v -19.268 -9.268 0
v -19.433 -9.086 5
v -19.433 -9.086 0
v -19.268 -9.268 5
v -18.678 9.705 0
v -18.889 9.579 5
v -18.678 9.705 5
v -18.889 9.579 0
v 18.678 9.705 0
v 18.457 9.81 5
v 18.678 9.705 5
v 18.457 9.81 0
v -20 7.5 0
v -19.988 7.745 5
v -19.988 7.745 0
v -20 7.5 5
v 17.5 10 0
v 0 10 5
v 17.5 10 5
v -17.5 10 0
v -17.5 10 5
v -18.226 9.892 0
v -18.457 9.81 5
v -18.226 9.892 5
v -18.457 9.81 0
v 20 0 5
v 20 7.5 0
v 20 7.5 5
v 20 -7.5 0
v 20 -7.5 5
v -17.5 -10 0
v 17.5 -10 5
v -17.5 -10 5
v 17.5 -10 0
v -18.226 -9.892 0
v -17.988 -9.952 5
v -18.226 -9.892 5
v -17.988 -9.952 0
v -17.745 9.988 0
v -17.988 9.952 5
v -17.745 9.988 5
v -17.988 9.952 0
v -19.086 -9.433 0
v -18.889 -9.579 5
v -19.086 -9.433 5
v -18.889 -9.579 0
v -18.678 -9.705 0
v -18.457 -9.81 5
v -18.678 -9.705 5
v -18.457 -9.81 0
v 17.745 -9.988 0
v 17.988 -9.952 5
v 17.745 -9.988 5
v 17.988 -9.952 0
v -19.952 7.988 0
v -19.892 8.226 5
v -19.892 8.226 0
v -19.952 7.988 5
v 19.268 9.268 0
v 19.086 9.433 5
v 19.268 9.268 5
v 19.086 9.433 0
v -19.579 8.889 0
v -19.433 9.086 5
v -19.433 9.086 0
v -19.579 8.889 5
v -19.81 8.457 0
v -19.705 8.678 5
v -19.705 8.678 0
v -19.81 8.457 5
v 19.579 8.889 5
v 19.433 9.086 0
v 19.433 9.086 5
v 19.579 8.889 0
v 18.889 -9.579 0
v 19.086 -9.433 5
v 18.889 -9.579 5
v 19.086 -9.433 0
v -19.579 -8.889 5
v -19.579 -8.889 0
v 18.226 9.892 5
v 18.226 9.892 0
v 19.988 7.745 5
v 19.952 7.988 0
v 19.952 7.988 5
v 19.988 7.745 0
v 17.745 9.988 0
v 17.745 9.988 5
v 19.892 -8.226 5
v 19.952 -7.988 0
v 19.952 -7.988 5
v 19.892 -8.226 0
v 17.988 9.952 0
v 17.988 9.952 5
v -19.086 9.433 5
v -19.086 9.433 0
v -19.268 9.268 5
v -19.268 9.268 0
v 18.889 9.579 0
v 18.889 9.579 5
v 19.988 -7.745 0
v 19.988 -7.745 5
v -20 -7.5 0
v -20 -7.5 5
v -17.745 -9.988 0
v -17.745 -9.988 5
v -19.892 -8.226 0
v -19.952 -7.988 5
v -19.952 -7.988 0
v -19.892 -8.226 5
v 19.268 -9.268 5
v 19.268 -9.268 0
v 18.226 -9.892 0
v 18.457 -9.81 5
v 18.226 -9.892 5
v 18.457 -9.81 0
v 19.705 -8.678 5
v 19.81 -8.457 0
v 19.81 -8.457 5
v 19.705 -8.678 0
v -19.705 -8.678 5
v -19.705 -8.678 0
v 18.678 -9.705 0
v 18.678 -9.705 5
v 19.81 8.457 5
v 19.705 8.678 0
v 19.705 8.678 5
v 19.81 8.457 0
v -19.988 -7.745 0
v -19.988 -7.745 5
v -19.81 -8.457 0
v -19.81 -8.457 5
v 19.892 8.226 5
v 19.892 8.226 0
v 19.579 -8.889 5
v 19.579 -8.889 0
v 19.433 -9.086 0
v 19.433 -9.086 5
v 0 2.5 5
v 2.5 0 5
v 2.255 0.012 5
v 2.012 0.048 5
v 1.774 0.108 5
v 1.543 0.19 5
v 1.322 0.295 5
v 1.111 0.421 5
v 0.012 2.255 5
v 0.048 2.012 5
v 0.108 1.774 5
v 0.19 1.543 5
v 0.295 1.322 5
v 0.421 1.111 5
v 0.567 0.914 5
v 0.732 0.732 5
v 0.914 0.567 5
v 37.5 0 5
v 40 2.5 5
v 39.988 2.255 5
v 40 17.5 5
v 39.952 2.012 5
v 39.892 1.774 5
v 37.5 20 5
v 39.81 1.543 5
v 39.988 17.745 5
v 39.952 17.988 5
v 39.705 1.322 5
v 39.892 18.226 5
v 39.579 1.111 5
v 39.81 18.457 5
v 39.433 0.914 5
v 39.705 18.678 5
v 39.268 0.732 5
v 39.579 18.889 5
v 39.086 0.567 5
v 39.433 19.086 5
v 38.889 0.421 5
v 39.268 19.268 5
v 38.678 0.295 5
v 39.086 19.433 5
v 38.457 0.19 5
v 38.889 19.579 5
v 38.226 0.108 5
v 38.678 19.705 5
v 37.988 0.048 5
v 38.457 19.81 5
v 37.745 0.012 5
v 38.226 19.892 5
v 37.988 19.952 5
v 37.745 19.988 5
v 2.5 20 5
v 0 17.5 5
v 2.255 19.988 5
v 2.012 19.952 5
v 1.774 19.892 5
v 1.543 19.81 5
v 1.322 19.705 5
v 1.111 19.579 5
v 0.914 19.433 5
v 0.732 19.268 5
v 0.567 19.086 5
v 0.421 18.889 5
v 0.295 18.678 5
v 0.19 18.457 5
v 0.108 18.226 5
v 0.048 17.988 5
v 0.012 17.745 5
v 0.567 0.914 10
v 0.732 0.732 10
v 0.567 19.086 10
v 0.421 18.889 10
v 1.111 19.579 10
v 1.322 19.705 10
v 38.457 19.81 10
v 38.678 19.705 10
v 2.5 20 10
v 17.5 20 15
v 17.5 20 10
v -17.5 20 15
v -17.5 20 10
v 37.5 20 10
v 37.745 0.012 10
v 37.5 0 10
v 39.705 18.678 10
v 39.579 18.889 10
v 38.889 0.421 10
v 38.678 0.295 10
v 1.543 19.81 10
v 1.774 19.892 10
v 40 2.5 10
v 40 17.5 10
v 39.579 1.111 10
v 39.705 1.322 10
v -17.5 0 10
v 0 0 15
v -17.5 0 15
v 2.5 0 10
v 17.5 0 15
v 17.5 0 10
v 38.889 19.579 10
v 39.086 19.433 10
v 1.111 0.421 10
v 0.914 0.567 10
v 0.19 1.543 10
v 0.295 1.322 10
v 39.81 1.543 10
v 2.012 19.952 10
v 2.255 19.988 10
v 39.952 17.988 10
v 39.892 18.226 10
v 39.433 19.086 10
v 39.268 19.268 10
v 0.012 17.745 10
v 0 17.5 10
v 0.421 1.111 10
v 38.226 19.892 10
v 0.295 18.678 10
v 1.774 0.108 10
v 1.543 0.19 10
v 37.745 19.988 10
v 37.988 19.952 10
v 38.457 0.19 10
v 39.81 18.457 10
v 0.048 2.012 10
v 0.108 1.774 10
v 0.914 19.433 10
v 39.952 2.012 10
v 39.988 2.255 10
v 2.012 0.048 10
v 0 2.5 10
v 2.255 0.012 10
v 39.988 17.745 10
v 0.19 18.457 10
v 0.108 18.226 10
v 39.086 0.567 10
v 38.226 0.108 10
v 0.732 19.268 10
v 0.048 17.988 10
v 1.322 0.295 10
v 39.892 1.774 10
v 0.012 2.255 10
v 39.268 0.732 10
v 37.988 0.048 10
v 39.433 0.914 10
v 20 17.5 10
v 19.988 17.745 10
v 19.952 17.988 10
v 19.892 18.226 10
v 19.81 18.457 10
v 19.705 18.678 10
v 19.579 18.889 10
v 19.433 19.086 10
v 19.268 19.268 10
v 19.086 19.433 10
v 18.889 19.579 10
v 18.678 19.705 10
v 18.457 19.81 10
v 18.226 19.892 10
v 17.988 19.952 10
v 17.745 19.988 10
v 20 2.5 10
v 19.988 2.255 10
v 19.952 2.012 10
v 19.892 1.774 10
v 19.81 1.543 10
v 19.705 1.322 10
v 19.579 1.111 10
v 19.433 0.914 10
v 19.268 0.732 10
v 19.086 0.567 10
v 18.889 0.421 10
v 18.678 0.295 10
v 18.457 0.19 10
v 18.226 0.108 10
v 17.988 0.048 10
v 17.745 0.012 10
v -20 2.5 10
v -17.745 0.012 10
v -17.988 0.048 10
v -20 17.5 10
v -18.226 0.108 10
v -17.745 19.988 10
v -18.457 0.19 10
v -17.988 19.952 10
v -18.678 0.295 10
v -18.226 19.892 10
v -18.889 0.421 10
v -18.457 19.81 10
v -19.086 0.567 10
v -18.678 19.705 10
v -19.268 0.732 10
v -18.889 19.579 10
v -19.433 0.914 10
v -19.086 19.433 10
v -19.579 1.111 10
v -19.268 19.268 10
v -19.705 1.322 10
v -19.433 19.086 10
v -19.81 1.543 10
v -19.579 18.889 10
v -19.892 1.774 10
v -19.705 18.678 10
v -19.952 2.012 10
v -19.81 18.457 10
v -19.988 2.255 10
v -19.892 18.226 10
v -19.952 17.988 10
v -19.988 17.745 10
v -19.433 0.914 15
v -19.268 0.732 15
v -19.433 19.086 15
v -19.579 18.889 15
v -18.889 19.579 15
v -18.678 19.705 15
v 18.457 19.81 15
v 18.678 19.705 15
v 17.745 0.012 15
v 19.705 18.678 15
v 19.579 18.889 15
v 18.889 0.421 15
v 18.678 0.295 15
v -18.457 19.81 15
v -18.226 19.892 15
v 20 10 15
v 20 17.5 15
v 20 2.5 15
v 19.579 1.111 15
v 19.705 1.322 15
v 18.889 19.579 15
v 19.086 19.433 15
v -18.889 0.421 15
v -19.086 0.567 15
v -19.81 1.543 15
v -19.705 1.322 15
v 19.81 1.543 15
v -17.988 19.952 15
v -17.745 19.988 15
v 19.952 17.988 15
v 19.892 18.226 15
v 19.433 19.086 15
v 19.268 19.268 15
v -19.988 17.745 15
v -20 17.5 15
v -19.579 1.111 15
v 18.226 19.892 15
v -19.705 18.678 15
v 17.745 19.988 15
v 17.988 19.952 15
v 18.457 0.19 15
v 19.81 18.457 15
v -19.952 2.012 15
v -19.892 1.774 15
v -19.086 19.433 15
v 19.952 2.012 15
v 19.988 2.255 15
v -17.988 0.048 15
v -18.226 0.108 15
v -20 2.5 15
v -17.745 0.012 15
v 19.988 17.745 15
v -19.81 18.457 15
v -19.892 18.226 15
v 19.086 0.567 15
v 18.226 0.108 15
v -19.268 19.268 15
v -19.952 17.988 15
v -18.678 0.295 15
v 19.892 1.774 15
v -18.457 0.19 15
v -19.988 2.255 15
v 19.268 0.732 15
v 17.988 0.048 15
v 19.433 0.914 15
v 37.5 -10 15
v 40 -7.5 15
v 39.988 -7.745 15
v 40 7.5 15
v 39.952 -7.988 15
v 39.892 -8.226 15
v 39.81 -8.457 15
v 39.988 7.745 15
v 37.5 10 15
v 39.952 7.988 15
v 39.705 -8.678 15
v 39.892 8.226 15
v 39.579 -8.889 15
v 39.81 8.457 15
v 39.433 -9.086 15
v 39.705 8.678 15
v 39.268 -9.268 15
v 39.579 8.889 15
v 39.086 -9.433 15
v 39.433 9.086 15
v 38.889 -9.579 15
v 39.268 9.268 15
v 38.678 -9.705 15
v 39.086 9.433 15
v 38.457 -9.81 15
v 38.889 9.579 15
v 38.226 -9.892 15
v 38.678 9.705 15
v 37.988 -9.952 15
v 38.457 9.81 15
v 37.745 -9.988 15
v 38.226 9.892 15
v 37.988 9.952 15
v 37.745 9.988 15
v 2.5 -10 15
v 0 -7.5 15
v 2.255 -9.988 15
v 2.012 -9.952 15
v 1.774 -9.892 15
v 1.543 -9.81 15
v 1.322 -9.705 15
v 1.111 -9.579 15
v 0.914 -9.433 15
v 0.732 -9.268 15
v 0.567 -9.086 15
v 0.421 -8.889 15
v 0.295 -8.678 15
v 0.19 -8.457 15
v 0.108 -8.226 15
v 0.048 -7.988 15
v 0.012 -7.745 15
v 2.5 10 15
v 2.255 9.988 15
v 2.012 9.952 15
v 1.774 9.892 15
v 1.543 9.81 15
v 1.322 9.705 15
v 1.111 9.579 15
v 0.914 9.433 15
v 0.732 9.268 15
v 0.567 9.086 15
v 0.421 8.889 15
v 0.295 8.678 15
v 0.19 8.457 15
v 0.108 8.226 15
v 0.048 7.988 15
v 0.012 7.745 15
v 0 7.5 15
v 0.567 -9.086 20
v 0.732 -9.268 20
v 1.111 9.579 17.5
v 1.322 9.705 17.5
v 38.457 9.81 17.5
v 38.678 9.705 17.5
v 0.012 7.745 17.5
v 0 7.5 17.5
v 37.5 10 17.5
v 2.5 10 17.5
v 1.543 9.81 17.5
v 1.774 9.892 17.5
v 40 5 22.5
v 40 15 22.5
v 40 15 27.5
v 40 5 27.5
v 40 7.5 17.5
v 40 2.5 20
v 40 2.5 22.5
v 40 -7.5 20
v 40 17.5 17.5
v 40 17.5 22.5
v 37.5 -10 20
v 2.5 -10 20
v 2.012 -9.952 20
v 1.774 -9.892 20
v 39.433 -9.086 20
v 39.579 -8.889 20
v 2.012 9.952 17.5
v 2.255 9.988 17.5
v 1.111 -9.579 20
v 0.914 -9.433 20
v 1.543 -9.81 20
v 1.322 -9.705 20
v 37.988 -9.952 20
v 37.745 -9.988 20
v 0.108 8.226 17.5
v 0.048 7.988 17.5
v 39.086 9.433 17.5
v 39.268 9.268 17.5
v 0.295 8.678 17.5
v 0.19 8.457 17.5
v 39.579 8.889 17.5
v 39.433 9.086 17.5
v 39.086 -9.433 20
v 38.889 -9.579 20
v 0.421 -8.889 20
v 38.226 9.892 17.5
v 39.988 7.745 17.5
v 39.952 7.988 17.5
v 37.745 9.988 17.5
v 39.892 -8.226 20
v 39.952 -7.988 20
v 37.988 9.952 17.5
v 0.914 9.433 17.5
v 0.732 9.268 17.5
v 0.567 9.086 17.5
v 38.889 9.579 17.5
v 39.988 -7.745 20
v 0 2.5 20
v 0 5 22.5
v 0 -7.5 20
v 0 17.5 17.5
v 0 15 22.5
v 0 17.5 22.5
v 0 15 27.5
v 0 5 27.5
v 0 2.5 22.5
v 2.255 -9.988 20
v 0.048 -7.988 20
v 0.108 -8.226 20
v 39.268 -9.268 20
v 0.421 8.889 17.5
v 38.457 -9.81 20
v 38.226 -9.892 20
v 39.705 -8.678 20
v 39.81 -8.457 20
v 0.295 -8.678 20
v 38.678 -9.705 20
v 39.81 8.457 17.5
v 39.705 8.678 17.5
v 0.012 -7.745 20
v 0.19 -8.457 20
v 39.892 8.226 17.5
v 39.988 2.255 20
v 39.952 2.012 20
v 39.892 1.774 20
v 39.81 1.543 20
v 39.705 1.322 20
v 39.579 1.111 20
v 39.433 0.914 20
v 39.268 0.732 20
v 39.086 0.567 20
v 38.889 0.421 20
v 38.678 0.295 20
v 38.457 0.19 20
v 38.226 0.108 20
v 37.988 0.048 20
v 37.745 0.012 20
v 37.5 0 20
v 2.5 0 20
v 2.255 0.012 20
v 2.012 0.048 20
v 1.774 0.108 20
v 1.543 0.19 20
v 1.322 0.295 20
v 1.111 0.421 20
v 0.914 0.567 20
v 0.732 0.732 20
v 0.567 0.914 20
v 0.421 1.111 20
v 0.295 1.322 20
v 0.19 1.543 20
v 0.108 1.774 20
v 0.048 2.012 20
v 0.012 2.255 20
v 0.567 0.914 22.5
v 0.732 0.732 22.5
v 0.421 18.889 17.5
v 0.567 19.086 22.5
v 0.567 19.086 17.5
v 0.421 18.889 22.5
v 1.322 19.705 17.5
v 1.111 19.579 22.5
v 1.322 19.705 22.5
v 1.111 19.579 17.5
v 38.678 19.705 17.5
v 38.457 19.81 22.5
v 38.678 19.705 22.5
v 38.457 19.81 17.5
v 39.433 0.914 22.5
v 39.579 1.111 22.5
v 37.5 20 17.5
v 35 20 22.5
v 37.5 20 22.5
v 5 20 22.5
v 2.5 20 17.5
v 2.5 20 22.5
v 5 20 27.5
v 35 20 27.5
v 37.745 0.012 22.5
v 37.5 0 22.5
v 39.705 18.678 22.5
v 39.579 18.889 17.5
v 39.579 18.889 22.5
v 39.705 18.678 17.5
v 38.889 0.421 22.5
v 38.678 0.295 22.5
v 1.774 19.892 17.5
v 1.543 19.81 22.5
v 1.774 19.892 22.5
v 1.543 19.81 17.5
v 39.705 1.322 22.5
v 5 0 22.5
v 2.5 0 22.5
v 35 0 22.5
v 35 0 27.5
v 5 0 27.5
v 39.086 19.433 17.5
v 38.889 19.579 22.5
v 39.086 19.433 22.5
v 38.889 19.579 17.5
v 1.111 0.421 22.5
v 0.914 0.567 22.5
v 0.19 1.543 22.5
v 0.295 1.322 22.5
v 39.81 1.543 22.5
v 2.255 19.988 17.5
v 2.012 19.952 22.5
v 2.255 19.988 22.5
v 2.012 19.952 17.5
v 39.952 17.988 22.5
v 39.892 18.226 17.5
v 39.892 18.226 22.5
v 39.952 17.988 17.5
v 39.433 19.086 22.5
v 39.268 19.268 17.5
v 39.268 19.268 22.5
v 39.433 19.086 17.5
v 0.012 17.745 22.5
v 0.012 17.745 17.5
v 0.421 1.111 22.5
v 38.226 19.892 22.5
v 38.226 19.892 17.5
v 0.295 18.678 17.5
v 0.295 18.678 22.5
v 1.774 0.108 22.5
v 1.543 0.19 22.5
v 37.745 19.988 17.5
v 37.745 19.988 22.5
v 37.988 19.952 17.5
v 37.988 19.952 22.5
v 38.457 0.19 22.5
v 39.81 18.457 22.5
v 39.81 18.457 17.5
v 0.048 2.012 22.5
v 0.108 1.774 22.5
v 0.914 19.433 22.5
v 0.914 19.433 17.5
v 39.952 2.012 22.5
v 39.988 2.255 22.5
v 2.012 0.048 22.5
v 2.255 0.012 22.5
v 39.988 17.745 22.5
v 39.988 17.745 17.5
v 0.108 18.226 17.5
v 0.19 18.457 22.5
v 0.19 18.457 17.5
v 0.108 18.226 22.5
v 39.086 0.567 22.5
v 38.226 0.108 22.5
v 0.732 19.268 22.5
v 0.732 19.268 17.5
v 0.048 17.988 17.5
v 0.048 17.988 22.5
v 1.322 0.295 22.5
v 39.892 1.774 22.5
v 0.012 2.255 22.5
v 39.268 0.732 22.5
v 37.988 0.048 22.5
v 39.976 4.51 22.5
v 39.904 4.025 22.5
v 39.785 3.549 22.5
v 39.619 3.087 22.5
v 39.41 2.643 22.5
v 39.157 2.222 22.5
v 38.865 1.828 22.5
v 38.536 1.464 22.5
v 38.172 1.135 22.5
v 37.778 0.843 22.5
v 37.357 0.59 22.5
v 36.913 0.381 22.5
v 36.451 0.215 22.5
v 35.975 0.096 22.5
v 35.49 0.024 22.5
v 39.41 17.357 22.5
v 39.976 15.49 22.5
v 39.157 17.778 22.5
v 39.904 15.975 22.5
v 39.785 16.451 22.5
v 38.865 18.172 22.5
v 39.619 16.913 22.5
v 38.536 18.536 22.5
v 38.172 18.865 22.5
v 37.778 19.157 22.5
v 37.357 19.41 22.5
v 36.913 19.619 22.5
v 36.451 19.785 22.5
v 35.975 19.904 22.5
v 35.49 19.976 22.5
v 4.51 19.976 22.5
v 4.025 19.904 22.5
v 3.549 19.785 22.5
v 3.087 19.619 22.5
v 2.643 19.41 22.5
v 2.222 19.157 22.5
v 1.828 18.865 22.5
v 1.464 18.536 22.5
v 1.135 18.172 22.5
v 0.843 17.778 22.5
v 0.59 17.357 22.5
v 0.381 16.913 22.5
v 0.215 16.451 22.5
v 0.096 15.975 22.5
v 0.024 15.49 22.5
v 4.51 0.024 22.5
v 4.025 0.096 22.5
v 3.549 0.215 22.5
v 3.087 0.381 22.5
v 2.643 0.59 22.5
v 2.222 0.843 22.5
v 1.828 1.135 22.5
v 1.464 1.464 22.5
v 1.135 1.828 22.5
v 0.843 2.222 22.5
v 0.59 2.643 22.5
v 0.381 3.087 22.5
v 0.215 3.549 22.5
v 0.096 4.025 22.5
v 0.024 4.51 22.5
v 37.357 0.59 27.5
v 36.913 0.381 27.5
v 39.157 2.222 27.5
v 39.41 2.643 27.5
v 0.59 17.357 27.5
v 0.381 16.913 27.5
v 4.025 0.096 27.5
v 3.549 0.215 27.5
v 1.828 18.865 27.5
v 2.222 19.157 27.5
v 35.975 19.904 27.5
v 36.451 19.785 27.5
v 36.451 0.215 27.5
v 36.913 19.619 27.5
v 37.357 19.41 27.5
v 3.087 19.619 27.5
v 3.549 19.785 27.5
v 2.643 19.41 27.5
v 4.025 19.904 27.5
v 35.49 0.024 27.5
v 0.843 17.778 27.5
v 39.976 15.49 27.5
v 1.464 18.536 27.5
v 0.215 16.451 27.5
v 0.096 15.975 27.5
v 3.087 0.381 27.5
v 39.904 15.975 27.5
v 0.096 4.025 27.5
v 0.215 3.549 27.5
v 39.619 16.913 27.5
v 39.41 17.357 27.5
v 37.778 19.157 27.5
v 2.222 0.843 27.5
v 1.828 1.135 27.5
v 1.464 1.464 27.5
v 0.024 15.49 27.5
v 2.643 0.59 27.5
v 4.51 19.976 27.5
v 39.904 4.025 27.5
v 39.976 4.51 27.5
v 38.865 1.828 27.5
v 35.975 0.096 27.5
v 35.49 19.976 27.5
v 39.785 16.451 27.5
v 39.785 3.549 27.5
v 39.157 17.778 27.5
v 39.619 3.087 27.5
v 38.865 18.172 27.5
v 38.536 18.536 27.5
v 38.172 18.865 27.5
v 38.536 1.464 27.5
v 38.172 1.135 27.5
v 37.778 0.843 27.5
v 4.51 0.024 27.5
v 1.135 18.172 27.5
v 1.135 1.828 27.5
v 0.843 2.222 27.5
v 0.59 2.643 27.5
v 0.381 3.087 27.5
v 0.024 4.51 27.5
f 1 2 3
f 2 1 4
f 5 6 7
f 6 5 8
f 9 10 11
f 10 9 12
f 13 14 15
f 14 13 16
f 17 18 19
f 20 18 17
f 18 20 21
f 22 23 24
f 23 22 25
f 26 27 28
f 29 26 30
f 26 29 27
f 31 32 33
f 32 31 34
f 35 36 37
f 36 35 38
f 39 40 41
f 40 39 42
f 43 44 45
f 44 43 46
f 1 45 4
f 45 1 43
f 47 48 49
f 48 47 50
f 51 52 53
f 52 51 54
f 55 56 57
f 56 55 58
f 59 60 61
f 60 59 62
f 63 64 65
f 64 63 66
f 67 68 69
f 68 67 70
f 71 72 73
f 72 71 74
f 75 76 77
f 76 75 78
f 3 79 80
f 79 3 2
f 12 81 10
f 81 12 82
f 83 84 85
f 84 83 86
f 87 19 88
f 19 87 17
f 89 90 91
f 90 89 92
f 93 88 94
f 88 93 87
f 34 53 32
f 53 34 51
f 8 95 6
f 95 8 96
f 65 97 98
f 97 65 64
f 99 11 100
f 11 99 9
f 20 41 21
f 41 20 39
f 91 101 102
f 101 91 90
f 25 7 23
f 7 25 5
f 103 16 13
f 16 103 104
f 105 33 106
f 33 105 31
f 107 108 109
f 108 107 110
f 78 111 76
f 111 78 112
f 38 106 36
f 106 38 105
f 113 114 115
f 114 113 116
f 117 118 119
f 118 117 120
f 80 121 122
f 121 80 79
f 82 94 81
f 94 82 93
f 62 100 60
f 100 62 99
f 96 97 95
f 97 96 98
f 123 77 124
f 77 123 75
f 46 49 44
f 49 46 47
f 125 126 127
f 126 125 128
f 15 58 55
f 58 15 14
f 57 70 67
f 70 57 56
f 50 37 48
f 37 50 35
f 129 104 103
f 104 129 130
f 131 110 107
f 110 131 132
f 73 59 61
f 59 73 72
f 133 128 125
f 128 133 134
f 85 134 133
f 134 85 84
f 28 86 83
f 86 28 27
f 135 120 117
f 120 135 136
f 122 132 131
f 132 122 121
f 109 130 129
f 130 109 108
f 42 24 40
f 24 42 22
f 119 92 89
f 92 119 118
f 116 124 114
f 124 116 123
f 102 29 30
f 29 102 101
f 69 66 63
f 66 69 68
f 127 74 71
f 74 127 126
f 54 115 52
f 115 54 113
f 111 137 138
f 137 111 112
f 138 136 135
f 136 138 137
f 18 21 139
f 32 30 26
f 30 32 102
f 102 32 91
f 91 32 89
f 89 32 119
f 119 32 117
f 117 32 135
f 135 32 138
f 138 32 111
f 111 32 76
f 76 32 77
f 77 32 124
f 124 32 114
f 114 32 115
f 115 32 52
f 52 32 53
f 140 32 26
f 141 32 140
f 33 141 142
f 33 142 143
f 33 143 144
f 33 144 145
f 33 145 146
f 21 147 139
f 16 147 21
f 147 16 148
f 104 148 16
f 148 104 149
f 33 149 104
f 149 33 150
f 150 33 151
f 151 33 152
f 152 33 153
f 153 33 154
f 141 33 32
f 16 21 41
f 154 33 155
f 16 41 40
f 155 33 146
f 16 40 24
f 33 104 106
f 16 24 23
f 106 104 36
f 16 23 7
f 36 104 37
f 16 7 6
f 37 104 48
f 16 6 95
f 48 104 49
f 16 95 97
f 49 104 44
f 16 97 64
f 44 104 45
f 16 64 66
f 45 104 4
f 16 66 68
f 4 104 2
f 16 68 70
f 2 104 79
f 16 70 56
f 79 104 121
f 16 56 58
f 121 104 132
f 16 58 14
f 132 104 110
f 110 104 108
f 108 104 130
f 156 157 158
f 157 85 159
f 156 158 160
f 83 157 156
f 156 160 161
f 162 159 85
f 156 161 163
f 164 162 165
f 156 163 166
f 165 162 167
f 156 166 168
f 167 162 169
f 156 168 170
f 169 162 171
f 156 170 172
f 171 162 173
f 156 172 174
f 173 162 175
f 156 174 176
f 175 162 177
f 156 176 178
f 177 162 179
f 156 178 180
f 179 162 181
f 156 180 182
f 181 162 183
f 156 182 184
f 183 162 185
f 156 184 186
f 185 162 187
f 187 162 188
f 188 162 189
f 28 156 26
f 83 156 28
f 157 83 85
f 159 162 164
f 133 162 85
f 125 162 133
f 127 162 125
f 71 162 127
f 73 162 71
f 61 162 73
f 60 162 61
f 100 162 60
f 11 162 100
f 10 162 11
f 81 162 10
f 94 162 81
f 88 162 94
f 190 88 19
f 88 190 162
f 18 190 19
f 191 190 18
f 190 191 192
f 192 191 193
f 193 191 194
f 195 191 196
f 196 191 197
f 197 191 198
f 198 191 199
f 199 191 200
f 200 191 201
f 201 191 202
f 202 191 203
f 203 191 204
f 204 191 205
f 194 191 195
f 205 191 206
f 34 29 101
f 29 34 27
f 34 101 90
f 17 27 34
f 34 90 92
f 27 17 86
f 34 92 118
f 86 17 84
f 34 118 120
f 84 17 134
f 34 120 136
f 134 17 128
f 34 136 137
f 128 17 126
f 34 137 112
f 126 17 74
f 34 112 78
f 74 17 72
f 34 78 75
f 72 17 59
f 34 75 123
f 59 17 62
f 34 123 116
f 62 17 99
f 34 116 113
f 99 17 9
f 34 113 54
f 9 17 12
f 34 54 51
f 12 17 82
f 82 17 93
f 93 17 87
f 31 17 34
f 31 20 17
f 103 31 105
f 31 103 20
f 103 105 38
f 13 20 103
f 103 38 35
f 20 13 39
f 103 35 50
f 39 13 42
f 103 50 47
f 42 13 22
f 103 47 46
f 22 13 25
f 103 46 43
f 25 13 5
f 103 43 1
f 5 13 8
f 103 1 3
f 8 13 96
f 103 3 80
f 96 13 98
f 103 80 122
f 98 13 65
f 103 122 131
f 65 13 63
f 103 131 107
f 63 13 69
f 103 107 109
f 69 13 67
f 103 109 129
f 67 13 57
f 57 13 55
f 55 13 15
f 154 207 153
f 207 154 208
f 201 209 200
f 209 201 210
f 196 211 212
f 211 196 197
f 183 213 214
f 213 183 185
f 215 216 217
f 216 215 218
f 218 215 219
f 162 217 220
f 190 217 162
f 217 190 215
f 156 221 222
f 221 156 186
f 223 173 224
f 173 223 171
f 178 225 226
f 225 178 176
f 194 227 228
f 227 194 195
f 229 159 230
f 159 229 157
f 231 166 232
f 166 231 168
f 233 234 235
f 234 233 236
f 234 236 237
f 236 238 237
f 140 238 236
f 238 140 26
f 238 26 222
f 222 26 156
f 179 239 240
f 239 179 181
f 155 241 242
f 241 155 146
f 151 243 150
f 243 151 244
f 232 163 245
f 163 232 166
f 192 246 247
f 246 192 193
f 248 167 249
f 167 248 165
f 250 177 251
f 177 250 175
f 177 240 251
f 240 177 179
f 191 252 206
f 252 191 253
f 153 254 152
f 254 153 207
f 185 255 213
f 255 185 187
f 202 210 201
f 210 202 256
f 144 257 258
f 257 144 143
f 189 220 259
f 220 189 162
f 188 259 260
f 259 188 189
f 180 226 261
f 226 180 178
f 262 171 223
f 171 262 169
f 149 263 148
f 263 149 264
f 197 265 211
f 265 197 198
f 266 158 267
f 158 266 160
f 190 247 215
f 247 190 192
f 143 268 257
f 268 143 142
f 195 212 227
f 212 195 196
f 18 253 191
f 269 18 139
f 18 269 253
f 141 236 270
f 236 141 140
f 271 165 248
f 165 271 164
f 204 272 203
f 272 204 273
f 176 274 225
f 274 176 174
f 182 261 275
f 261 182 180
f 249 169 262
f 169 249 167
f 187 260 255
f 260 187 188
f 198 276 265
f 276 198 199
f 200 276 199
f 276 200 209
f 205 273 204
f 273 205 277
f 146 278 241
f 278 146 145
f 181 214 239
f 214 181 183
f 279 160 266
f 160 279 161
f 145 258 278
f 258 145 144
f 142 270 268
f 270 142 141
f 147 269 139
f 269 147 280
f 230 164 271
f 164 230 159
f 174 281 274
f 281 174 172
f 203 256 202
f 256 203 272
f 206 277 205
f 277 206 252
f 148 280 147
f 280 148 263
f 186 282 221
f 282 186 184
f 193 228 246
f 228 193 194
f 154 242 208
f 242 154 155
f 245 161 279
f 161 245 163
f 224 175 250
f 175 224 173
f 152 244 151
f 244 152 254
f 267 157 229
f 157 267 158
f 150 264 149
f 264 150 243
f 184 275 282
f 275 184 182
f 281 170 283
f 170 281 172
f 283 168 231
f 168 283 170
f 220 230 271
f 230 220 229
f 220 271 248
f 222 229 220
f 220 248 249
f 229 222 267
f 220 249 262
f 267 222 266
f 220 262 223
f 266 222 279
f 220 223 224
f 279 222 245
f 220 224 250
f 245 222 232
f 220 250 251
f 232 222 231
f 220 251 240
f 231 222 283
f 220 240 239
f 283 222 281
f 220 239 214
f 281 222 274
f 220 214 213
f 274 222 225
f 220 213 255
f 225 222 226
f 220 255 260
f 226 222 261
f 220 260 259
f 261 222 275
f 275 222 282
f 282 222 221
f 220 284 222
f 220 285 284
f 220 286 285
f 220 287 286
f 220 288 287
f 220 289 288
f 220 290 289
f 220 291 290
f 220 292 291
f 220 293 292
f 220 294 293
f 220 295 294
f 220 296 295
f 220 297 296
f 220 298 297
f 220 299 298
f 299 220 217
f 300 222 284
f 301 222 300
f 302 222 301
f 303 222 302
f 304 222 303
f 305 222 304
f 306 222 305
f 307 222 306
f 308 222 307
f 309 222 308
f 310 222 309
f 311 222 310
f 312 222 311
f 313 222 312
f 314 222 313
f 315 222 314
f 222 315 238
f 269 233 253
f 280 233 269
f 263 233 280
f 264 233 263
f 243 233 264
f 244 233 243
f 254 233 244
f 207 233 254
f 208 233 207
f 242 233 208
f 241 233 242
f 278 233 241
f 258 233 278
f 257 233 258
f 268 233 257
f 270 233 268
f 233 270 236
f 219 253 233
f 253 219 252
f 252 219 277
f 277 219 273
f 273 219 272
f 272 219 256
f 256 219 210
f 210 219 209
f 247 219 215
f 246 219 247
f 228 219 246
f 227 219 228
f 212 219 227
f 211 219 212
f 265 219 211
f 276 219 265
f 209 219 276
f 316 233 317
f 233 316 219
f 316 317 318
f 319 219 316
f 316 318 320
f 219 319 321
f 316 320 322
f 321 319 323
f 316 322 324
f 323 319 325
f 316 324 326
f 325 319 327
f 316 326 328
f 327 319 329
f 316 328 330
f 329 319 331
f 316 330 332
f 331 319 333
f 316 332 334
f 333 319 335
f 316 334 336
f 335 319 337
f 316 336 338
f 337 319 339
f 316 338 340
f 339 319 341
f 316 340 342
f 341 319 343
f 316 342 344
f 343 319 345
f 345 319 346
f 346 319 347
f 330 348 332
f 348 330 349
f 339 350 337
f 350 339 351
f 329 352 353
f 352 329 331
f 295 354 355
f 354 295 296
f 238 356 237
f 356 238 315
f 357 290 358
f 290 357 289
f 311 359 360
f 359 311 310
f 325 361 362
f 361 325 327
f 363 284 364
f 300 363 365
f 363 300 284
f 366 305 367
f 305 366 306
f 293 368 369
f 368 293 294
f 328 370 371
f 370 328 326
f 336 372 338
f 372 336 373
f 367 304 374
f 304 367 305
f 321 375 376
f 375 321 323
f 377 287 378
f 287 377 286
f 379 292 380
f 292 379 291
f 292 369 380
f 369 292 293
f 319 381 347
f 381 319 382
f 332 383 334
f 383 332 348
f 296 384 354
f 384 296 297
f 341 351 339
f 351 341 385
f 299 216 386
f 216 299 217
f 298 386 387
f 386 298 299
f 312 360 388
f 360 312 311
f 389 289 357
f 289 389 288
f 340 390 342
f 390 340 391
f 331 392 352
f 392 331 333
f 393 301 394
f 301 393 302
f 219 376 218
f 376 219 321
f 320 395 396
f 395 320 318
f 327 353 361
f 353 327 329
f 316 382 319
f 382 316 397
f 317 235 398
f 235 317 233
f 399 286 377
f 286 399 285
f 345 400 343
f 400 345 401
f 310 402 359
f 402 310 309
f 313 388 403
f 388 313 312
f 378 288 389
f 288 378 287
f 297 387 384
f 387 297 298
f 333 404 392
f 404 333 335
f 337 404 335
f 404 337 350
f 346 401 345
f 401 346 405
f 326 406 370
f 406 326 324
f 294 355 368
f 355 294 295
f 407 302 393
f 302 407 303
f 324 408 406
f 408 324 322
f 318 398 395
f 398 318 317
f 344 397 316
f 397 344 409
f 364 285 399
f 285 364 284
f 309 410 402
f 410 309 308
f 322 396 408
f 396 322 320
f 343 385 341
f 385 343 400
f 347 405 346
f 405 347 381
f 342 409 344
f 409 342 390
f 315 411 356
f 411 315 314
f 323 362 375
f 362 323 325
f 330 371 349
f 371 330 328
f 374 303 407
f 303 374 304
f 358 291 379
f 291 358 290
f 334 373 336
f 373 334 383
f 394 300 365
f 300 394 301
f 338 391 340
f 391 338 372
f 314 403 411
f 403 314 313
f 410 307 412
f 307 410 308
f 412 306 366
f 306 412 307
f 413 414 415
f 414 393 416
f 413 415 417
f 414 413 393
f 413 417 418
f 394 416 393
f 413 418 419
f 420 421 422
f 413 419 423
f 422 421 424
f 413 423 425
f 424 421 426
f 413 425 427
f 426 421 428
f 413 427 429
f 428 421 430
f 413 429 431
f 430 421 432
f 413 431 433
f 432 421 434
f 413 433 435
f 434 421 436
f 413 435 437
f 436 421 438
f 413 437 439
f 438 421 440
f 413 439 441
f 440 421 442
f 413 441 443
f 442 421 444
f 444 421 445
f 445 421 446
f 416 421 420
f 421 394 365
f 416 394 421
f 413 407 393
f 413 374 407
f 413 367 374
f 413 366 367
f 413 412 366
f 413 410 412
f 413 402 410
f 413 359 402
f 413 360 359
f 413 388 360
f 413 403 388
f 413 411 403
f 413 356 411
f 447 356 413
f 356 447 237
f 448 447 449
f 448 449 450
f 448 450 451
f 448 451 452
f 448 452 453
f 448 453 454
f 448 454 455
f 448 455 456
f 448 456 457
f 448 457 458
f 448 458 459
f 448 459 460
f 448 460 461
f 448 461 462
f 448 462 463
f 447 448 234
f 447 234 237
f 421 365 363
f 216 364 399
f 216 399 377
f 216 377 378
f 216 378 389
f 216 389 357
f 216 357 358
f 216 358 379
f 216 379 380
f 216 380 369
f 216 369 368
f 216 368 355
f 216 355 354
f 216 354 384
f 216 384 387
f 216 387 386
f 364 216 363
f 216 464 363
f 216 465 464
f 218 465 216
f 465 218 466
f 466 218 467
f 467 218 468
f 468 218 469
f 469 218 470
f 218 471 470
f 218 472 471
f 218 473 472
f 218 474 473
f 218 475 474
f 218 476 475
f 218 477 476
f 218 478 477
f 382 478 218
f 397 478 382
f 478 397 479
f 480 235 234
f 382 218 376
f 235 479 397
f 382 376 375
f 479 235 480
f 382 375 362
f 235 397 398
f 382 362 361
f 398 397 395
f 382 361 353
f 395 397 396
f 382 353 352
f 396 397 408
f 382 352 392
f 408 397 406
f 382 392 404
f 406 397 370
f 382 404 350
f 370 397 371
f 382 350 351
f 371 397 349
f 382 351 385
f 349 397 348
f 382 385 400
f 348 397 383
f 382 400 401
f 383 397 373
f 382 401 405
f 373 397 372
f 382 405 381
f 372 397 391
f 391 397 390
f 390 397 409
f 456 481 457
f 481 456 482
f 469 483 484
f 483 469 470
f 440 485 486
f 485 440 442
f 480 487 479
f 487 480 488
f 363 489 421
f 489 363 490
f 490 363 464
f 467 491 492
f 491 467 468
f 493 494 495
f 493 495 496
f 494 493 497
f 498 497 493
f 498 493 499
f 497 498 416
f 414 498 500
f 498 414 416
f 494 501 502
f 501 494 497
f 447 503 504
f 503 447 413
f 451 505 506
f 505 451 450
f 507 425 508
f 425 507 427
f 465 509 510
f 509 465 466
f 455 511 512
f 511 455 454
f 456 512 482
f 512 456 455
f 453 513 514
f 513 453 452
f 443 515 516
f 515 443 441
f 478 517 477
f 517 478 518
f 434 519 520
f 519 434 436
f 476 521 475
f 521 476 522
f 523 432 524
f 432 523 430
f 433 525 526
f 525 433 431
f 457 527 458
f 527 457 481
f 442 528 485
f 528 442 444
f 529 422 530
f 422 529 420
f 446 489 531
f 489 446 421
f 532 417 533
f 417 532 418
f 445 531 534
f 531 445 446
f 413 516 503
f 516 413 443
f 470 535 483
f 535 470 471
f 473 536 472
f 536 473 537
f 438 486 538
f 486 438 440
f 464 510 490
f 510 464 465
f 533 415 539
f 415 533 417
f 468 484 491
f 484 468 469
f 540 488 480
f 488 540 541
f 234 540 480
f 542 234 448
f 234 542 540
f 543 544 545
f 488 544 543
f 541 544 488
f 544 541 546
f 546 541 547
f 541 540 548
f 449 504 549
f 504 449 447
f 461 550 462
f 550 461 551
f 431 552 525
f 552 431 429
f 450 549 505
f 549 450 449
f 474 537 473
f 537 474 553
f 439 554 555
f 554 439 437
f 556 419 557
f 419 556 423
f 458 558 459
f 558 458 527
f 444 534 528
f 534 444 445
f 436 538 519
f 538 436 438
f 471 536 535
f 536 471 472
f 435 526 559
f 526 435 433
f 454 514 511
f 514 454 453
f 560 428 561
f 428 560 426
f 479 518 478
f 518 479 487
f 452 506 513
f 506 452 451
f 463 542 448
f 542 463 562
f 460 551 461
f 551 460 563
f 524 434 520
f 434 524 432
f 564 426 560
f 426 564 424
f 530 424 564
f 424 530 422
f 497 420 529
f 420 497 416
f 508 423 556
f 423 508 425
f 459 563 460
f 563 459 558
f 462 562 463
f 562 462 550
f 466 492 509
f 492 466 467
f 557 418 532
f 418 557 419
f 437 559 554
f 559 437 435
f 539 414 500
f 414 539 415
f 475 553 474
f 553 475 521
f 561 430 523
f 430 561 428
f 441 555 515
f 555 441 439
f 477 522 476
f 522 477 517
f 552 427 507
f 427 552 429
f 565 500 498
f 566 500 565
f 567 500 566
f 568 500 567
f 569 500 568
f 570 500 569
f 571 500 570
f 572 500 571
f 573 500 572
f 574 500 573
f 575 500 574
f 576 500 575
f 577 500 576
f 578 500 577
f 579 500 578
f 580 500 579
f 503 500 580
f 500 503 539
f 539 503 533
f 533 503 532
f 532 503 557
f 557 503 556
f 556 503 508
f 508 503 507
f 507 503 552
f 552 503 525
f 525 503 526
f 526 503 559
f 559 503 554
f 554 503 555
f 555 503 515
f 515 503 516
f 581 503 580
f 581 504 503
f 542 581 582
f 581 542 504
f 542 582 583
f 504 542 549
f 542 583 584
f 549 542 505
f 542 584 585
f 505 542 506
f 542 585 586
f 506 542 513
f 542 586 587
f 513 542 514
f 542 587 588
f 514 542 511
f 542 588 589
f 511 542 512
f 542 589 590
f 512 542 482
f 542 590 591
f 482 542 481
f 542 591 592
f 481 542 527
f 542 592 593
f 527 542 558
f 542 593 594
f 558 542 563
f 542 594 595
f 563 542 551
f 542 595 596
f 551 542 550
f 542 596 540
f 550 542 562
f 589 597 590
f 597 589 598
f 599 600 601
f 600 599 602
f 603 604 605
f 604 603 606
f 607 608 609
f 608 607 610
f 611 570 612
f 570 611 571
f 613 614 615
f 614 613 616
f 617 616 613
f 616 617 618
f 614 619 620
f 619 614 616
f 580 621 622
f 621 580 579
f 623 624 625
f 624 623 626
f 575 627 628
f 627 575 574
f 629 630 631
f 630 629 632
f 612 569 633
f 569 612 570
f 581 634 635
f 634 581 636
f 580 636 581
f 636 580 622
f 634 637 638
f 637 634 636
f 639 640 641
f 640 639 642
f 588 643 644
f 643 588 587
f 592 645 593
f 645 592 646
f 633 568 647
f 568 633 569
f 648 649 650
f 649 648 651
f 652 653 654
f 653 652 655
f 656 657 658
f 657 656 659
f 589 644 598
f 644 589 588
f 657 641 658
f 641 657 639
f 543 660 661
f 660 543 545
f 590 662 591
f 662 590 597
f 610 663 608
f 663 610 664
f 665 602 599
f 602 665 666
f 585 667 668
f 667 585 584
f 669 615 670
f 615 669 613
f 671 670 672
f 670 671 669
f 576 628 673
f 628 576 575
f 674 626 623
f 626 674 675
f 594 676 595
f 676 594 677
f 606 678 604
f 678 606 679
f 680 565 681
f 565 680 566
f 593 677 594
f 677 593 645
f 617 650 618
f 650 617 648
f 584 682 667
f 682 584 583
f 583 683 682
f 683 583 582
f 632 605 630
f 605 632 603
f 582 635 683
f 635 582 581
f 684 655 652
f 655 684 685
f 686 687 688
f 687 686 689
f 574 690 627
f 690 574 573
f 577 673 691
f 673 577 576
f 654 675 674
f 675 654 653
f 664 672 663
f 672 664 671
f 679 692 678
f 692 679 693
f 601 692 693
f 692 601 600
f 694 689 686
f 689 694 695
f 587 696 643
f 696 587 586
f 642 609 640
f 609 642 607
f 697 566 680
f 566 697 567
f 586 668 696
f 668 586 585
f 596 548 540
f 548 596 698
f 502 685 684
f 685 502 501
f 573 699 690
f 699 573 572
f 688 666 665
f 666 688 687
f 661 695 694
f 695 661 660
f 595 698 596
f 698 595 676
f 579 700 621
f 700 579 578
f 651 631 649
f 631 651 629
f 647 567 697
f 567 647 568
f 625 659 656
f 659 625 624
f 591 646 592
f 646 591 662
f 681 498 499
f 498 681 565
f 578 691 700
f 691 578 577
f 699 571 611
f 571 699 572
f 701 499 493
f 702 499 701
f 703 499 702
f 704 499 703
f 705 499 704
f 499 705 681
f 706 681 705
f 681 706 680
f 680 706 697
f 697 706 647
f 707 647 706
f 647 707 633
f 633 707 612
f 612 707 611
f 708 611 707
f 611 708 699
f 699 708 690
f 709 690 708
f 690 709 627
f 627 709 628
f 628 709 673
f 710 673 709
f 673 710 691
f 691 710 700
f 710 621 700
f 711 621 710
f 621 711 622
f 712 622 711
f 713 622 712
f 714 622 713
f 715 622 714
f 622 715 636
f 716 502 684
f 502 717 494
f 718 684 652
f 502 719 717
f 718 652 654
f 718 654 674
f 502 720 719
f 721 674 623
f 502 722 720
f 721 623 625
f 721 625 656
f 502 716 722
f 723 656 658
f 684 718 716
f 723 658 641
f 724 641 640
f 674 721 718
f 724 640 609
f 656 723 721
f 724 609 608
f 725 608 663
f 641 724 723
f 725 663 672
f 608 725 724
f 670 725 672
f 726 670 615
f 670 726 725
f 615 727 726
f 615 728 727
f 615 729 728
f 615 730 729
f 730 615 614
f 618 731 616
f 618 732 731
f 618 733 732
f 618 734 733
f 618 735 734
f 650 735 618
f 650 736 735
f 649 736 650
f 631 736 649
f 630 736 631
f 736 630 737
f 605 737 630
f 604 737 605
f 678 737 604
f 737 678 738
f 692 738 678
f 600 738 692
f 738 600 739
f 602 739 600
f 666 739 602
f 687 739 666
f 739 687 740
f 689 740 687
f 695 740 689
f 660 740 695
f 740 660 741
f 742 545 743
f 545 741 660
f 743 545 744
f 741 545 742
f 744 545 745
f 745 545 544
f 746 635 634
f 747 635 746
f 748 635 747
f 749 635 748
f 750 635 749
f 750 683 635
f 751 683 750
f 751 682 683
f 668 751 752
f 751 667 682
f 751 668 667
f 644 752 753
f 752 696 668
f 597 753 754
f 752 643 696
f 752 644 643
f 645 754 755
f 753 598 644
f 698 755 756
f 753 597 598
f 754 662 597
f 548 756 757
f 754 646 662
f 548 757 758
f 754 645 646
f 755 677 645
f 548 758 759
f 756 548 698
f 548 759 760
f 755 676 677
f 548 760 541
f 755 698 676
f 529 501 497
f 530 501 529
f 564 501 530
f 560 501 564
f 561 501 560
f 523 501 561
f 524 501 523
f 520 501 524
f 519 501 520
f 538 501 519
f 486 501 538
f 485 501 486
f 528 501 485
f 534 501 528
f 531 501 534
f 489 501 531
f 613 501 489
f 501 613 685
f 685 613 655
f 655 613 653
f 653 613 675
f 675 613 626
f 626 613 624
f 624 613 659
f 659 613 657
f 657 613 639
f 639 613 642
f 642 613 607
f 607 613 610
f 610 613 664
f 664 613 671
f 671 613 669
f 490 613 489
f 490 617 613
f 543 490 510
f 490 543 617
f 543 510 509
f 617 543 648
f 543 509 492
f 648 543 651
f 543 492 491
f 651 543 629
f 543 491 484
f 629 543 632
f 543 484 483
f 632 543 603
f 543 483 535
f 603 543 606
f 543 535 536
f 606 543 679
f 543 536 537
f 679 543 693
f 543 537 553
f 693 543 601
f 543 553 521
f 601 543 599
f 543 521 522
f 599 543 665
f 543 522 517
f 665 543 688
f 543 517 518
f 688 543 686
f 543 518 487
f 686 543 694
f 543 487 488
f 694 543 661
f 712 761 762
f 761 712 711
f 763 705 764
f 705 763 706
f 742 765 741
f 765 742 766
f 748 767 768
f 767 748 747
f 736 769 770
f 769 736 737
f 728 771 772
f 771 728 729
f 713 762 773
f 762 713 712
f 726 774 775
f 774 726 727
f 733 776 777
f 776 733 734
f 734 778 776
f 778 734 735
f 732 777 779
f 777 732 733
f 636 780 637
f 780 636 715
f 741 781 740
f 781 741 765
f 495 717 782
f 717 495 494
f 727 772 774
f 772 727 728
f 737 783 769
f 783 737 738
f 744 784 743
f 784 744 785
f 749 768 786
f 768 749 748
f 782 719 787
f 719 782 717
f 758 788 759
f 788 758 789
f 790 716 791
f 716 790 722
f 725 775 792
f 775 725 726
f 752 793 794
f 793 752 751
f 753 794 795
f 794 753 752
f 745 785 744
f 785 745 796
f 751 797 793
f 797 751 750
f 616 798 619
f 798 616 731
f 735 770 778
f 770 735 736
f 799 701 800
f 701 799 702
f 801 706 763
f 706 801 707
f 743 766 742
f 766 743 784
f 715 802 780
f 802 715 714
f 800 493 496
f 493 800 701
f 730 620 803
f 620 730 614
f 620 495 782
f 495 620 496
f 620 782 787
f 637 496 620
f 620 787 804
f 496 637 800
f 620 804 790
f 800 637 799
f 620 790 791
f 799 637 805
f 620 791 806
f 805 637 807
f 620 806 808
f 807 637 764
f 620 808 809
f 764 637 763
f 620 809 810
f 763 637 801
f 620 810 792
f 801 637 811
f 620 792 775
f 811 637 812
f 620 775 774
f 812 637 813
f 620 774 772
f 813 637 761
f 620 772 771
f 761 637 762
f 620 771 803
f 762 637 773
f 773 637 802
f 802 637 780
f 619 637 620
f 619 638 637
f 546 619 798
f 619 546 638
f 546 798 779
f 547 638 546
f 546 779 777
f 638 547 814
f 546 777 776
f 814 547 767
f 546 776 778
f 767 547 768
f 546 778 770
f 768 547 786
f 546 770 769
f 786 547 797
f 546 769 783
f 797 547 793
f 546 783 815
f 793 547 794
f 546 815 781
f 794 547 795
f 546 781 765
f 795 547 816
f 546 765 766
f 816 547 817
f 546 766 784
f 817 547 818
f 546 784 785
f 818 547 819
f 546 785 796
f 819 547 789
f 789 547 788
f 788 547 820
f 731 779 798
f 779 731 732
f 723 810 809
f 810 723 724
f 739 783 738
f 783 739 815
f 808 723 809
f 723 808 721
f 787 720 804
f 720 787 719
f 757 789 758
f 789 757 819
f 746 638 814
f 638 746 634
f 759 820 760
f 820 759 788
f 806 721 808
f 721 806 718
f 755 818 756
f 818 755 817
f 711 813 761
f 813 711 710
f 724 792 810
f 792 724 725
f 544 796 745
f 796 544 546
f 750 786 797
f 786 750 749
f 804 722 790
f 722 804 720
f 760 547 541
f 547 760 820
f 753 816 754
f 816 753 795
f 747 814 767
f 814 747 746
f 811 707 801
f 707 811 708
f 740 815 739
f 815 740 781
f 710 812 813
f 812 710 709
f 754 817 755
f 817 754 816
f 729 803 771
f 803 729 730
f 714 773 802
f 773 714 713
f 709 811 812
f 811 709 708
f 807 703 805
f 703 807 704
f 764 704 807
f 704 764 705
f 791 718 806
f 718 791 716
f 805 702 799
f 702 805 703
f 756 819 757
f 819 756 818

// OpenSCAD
module Rcube(){
  union(){
    translate([-20, -10, 0])color("yellow")union()translate([2.5, 2.5, 0])hull(){
              cylinder(d=5,h=5,$fn=64);
              translate([35, 0, 0])cylinder(d=5,h=5,$fn=64);
              translate([0, 15, 0])cylinder(d=5,h=5,$fn=64);
              translate([35, 15, 0])cylinder(d=5,h=5,$fn=64);
            }

    translate([0, 0, 5])color("orange")union()translate([2.5, 2.5, 0])hull(){
              cylinder(d=5,h=5,$fn=64);
              translate([35, 0, 0])cylinder(d=5,h=5,$fn=64);
              translate([0, 15, 0])cylinder(d=5,h=5,$fn=64);
              translate([35, 15, 0])cylinder(d=5,h=5,$fn=64);
            }

    translate([-20, 0, 10])color("red")union()translate([2.5, 2.5, 0])hull(){
              cylinder(d=5,h=5,$fn=64);
              translate([35, 0, 0])cylinder(d=5,h=5,$fn=64);
              translate([0, 15, 0])cylinder(d=5,h=5,$fn=64);
              translate([35, 15, 0])cylinder(d=5,h=5,$fn=64);
            }

    translate([0, -10, 15])color("pink")union()translate([2.5, 2.5, 0])hull(){
              cylinder(d=5,h=5,$fn=64);
              translate([35, 0, 0])cylinder(d=5,h=5,$fn=64);
              translate([0, 15, 0])cylinder(d=5,h=5,$fn=64);
              translate([35, 15, 0])cylinder(d=5,h=5,$fn=64);
            }

    translate([0, 0, 17.5])color("purple")union()translate([2.5, 2.5, 0])hull(){
              cylinder(d=5,h=5,$fn=64);
              translate([35, 0, 0])cylinder(d=5,h=5,$fn=64);
              translate([0, 15, 0])cylinder(d=5,h=5,$fn=64);
              translate([35, 15, 0])cylinder(d=5,h=5,$fn=64);
            }

    translate([0, 0, 22.5])color("blue")union()translate([5, 5, 0])hull(){
              cylinder(d=10,h=5,$fn=64);
              translate([30, 0, 0])cylinder(d=10,h=5,$fn=64);
              translate([0, 10, 0])cylinder(d=10,h=5,$fn=64);
              translate([30, 10, 0])cylinder(d=10,h=5,$fn=64);
            }

  }
}
$fn=64;
Rcube();
